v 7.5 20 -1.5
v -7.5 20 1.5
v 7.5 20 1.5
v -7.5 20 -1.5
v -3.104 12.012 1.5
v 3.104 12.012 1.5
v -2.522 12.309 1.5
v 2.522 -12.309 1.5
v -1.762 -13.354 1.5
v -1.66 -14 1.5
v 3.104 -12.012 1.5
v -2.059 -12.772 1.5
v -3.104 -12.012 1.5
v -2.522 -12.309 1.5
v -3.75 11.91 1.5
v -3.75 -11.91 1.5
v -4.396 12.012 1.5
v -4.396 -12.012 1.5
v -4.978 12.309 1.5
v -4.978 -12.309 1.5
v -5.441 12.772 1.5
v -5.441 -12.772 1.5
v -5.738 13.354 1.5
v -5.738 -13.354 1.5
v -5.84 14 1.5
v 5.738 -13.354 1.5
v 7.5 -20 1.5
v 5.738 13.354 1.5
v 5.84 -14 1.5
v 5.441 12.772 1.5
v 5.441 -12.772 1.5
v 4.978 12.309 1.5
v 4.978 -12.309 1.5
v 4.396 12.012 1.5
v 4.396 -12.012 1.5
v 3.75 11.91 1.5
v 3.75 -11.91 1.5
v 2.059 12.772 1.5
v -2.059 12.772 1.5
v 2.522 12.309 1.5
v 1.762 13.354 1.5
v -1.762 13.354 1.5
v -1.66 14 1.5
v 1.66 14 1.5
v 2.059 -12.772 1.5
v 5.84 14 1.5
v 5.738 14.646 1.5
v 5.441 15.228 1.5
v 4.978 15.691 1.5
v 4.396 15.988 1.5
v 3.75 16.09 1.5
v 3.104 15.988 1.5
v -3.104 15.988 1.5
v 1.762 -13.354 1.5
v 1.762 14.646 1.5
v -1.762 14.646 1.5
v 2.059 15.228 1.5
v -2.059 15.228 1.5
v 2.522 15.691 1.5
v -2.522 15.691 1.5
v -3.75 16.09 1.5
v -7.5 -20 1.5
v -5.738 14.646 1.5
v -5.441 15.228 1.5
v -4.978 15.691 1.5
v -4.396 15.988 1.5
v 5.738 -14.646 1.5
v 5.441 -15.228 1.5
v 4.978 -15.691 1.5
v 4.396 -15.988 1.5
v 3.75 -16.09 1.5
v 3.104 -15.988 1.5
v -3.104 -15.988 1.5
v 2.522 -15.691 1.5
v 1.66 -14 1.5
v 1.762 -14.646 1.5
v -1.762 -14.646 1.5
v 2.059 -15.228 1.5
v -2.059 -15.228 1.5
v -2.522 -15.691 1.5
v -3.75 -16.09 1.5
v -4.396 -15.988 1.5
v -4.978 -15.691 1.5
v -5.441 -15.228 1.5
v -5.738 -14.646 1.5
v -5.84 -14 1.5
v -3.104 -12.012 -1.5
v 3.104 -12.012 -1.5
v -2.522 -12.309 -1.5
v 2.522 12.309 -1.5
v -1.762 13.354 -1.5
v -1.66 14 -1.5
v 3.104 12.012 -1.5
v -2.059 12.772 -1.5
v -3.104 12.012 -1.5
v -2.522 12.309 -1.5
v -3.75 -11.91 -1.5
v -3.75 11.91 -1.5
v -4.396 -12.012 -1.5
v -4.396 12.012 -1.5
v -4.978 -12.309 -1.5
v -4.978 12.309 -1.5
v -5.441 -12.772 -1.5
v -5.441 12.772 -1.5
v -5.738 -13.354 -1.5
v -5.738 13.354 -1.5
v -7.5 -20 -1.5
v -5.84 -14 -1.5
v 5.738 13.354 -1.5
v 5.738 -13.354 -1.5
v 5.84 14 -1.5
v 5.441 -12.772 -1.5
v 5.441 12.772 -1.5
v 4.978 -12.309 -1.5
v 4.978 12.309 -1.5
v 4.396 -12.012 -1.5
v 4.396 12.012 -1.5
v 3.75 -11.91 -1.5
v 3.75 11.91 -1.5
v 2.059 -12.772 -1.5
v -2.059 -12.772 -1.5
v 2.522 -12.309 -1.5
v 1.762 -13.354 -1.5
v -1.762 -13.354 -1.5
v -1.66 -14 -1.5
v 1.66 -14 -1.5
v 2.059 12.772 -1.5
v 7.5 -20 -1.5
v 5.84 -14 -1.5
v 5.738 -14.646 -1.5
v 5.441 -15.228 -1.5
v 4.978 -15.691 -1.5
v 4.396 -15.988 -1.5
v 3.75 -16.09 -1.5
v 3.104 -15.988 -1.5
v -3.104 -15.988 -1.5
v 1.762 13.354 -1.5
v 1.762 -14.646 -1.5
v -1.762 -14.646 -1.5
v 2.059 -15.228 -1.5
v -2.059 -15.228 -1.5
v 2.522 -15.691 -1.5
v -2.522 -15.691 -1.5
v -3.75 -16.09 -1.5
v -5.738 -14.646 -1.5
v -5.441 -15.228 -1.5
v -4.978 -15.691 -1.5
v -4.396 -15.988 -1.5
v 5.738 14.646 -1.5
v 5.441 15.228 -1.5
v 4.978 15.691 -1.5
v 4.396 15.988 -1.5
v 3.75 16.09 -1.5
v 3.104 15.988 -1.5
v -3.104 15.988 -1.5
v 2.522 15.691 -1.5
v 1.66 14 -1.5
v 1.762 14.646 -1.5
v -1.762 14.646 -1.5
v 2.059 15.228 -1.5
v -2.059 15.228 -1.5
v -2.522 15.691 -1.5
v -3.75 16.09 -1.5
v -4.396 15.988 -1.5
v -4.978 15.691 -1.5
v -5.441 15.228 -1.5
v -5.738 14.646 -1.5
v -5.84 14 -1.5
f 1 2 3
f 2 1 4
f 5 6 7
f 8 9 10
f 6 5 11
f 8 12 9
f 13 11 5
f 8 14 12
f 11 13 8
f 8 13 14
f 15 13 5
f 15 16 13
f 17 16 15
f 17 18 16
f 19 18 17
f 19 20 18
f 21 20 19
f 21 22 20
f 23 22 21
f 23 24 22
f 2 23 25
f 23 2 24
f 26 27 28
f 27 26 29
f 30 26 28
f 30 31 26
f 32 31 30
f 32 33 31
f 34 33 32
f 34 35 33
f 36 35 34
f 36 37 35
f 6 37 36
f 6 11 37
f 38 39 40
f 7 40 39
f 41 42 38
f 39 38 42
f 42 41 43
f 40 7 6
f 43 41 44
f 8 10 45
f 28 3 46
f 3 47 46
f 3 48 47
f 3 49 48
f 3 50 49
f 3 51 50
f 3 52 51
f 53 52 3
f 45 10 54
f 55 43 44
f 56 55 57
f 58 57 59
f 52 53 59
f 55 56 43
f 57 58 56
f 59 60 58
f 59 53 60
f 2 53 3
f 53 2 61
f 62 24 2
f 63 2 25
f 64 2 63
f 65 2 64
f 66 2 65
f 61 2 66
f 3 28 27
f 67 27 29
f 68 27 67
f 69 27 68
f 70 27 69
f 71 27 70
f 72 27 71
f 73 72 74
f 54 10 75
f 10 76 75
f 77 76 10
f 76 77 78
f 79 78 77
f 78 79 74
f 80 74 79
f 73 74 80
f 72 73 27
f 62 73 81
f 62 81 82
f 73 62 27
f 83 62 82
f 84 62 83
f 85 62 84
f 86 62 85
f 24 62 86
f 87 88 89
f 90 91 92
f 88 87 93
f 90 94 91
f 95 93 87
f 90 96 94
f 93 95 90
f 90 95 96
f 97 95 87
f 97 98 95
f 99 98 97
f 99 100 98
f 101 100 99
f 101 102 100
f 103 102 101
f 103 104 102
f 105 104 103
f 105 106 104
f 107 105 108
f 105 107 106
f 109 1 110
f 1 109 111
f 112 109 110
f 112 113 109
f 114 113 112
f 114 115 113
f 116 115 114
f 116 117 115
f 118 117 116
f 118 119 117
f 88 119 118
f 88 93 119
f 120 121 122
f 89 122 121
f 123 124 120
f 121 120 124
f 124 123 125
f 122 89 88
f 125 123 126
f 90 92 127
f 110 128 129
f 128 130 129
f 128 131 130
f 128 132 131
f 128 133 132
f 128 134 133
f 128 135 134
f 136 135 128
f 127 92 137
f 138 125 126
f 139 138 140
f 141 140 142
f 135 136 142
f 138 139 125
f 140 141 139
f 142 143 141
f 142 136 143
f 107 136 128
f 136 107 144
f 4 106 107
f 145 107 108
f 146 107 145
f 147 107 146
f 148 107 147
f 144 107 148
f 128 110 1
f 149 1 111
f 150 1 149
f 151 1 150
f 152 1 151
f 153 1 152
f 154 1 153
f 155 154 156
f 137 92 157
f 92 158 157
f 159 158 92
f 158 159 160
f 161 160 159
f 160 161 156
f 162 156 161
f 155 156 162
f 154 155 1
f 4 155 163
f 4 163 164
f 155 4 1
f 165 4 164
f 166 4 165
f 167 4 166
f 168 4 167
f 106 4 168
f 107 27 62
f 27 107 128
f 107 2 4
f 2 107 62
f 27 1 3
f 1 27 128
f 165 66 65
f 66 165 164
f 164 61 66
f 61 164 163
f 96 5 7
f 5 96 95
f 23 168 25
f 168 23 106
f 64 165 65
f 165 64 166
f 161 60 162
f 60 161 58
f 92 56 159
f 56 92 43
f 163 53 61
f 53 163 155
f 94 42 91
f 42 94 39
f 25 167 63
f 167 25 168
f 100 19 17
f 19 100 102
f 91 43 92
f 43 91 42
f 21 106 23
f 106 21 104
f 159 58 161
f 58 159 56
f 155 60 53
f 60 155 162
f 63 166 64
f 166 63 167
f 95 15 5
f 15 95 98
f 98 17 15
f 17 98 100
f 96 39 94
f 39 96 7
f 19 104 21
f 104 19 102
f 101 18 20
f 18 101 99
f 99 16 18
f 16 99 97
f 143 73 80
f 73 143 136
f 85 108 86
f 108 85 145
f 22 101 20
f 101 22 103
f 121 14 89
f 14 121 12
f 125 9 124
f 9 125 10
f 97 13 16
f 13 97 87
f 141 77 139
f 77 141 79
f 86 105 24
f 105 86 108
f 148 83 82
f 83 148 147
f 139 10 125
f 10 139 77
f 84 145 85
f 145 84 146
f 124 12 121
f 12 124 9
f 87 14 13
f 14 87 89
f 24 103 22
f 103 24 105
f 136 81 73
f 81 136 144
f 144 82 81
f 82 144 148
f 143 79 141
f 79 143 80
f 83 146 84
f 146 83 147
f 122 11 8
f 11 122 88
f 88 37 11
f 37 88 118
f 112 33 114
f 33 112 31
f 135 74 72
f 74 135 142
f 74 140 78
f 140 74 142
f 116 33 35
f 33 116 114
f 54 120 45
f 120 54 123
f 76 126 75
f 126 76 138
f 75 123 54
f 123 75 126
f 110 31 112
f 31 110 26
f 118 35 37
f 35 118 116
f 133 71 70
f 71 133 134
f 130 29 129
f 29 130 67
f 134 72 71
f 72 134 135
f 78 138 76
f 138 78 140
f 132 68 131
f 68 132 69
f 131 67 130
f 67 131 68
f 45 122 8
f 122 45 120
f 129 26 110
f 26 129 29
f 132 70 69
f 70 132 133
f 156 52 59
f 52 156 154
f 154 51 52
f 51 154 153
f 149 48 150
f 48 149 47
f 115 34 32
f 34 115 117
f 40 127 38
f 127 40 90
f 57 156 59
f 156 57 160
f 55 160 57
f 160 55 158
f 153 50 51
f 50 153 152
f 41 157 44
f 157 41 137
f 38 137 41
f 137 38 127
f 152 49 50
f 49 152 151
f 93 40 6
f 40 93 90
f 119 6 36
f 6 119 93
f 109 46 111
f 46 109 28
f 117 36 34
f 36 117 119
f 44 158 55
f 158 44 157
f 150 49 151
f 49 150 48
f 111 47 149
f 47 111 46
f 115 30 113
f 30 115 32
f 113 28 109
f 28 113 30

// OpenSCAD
// file: MakerBotSettings.scad
// Printer settings
extruder_width = 0.4;
global_correction = 0.04 + 2*extruder_width;
// main file
include <MakerBotSettings.scad>
// Screw Mounts
width = 40;
height = 15;
res=20; // Cylinder resolution
screw_offset_x = .35 * width;
screw_offset_y = .25 * height;
screw_radius = 1.25 + global_correction;
screw_height = 3;
module ScrewMount(x,y,z) {
	translate( [x,y,z] )
		rotate( 90 ) // Rotate for placement
		// Subtract screw holes from base
		difference()  {
			// Draw base
			cube( [width,height,3], center = true );
			// Draw screw holes
			Screw(screw_offset_x, screw_offset_y, 0);
			Screw(-1 * screw_offset_x, screw_offset_y, 0);
			Screw(-1 * screw_offset_x, -1 * screw_offset_y, 0);
			Screw(screw_offset_x, -1 * screw_offset_y, 0);
		}
}
module Screw(x,y,z) {
	translate( [x,y,z] )
		cylinder( screw_height, screw_radius, screw_radius, $fn=res, center = true );
}
ScrewMount(0,0,0);
